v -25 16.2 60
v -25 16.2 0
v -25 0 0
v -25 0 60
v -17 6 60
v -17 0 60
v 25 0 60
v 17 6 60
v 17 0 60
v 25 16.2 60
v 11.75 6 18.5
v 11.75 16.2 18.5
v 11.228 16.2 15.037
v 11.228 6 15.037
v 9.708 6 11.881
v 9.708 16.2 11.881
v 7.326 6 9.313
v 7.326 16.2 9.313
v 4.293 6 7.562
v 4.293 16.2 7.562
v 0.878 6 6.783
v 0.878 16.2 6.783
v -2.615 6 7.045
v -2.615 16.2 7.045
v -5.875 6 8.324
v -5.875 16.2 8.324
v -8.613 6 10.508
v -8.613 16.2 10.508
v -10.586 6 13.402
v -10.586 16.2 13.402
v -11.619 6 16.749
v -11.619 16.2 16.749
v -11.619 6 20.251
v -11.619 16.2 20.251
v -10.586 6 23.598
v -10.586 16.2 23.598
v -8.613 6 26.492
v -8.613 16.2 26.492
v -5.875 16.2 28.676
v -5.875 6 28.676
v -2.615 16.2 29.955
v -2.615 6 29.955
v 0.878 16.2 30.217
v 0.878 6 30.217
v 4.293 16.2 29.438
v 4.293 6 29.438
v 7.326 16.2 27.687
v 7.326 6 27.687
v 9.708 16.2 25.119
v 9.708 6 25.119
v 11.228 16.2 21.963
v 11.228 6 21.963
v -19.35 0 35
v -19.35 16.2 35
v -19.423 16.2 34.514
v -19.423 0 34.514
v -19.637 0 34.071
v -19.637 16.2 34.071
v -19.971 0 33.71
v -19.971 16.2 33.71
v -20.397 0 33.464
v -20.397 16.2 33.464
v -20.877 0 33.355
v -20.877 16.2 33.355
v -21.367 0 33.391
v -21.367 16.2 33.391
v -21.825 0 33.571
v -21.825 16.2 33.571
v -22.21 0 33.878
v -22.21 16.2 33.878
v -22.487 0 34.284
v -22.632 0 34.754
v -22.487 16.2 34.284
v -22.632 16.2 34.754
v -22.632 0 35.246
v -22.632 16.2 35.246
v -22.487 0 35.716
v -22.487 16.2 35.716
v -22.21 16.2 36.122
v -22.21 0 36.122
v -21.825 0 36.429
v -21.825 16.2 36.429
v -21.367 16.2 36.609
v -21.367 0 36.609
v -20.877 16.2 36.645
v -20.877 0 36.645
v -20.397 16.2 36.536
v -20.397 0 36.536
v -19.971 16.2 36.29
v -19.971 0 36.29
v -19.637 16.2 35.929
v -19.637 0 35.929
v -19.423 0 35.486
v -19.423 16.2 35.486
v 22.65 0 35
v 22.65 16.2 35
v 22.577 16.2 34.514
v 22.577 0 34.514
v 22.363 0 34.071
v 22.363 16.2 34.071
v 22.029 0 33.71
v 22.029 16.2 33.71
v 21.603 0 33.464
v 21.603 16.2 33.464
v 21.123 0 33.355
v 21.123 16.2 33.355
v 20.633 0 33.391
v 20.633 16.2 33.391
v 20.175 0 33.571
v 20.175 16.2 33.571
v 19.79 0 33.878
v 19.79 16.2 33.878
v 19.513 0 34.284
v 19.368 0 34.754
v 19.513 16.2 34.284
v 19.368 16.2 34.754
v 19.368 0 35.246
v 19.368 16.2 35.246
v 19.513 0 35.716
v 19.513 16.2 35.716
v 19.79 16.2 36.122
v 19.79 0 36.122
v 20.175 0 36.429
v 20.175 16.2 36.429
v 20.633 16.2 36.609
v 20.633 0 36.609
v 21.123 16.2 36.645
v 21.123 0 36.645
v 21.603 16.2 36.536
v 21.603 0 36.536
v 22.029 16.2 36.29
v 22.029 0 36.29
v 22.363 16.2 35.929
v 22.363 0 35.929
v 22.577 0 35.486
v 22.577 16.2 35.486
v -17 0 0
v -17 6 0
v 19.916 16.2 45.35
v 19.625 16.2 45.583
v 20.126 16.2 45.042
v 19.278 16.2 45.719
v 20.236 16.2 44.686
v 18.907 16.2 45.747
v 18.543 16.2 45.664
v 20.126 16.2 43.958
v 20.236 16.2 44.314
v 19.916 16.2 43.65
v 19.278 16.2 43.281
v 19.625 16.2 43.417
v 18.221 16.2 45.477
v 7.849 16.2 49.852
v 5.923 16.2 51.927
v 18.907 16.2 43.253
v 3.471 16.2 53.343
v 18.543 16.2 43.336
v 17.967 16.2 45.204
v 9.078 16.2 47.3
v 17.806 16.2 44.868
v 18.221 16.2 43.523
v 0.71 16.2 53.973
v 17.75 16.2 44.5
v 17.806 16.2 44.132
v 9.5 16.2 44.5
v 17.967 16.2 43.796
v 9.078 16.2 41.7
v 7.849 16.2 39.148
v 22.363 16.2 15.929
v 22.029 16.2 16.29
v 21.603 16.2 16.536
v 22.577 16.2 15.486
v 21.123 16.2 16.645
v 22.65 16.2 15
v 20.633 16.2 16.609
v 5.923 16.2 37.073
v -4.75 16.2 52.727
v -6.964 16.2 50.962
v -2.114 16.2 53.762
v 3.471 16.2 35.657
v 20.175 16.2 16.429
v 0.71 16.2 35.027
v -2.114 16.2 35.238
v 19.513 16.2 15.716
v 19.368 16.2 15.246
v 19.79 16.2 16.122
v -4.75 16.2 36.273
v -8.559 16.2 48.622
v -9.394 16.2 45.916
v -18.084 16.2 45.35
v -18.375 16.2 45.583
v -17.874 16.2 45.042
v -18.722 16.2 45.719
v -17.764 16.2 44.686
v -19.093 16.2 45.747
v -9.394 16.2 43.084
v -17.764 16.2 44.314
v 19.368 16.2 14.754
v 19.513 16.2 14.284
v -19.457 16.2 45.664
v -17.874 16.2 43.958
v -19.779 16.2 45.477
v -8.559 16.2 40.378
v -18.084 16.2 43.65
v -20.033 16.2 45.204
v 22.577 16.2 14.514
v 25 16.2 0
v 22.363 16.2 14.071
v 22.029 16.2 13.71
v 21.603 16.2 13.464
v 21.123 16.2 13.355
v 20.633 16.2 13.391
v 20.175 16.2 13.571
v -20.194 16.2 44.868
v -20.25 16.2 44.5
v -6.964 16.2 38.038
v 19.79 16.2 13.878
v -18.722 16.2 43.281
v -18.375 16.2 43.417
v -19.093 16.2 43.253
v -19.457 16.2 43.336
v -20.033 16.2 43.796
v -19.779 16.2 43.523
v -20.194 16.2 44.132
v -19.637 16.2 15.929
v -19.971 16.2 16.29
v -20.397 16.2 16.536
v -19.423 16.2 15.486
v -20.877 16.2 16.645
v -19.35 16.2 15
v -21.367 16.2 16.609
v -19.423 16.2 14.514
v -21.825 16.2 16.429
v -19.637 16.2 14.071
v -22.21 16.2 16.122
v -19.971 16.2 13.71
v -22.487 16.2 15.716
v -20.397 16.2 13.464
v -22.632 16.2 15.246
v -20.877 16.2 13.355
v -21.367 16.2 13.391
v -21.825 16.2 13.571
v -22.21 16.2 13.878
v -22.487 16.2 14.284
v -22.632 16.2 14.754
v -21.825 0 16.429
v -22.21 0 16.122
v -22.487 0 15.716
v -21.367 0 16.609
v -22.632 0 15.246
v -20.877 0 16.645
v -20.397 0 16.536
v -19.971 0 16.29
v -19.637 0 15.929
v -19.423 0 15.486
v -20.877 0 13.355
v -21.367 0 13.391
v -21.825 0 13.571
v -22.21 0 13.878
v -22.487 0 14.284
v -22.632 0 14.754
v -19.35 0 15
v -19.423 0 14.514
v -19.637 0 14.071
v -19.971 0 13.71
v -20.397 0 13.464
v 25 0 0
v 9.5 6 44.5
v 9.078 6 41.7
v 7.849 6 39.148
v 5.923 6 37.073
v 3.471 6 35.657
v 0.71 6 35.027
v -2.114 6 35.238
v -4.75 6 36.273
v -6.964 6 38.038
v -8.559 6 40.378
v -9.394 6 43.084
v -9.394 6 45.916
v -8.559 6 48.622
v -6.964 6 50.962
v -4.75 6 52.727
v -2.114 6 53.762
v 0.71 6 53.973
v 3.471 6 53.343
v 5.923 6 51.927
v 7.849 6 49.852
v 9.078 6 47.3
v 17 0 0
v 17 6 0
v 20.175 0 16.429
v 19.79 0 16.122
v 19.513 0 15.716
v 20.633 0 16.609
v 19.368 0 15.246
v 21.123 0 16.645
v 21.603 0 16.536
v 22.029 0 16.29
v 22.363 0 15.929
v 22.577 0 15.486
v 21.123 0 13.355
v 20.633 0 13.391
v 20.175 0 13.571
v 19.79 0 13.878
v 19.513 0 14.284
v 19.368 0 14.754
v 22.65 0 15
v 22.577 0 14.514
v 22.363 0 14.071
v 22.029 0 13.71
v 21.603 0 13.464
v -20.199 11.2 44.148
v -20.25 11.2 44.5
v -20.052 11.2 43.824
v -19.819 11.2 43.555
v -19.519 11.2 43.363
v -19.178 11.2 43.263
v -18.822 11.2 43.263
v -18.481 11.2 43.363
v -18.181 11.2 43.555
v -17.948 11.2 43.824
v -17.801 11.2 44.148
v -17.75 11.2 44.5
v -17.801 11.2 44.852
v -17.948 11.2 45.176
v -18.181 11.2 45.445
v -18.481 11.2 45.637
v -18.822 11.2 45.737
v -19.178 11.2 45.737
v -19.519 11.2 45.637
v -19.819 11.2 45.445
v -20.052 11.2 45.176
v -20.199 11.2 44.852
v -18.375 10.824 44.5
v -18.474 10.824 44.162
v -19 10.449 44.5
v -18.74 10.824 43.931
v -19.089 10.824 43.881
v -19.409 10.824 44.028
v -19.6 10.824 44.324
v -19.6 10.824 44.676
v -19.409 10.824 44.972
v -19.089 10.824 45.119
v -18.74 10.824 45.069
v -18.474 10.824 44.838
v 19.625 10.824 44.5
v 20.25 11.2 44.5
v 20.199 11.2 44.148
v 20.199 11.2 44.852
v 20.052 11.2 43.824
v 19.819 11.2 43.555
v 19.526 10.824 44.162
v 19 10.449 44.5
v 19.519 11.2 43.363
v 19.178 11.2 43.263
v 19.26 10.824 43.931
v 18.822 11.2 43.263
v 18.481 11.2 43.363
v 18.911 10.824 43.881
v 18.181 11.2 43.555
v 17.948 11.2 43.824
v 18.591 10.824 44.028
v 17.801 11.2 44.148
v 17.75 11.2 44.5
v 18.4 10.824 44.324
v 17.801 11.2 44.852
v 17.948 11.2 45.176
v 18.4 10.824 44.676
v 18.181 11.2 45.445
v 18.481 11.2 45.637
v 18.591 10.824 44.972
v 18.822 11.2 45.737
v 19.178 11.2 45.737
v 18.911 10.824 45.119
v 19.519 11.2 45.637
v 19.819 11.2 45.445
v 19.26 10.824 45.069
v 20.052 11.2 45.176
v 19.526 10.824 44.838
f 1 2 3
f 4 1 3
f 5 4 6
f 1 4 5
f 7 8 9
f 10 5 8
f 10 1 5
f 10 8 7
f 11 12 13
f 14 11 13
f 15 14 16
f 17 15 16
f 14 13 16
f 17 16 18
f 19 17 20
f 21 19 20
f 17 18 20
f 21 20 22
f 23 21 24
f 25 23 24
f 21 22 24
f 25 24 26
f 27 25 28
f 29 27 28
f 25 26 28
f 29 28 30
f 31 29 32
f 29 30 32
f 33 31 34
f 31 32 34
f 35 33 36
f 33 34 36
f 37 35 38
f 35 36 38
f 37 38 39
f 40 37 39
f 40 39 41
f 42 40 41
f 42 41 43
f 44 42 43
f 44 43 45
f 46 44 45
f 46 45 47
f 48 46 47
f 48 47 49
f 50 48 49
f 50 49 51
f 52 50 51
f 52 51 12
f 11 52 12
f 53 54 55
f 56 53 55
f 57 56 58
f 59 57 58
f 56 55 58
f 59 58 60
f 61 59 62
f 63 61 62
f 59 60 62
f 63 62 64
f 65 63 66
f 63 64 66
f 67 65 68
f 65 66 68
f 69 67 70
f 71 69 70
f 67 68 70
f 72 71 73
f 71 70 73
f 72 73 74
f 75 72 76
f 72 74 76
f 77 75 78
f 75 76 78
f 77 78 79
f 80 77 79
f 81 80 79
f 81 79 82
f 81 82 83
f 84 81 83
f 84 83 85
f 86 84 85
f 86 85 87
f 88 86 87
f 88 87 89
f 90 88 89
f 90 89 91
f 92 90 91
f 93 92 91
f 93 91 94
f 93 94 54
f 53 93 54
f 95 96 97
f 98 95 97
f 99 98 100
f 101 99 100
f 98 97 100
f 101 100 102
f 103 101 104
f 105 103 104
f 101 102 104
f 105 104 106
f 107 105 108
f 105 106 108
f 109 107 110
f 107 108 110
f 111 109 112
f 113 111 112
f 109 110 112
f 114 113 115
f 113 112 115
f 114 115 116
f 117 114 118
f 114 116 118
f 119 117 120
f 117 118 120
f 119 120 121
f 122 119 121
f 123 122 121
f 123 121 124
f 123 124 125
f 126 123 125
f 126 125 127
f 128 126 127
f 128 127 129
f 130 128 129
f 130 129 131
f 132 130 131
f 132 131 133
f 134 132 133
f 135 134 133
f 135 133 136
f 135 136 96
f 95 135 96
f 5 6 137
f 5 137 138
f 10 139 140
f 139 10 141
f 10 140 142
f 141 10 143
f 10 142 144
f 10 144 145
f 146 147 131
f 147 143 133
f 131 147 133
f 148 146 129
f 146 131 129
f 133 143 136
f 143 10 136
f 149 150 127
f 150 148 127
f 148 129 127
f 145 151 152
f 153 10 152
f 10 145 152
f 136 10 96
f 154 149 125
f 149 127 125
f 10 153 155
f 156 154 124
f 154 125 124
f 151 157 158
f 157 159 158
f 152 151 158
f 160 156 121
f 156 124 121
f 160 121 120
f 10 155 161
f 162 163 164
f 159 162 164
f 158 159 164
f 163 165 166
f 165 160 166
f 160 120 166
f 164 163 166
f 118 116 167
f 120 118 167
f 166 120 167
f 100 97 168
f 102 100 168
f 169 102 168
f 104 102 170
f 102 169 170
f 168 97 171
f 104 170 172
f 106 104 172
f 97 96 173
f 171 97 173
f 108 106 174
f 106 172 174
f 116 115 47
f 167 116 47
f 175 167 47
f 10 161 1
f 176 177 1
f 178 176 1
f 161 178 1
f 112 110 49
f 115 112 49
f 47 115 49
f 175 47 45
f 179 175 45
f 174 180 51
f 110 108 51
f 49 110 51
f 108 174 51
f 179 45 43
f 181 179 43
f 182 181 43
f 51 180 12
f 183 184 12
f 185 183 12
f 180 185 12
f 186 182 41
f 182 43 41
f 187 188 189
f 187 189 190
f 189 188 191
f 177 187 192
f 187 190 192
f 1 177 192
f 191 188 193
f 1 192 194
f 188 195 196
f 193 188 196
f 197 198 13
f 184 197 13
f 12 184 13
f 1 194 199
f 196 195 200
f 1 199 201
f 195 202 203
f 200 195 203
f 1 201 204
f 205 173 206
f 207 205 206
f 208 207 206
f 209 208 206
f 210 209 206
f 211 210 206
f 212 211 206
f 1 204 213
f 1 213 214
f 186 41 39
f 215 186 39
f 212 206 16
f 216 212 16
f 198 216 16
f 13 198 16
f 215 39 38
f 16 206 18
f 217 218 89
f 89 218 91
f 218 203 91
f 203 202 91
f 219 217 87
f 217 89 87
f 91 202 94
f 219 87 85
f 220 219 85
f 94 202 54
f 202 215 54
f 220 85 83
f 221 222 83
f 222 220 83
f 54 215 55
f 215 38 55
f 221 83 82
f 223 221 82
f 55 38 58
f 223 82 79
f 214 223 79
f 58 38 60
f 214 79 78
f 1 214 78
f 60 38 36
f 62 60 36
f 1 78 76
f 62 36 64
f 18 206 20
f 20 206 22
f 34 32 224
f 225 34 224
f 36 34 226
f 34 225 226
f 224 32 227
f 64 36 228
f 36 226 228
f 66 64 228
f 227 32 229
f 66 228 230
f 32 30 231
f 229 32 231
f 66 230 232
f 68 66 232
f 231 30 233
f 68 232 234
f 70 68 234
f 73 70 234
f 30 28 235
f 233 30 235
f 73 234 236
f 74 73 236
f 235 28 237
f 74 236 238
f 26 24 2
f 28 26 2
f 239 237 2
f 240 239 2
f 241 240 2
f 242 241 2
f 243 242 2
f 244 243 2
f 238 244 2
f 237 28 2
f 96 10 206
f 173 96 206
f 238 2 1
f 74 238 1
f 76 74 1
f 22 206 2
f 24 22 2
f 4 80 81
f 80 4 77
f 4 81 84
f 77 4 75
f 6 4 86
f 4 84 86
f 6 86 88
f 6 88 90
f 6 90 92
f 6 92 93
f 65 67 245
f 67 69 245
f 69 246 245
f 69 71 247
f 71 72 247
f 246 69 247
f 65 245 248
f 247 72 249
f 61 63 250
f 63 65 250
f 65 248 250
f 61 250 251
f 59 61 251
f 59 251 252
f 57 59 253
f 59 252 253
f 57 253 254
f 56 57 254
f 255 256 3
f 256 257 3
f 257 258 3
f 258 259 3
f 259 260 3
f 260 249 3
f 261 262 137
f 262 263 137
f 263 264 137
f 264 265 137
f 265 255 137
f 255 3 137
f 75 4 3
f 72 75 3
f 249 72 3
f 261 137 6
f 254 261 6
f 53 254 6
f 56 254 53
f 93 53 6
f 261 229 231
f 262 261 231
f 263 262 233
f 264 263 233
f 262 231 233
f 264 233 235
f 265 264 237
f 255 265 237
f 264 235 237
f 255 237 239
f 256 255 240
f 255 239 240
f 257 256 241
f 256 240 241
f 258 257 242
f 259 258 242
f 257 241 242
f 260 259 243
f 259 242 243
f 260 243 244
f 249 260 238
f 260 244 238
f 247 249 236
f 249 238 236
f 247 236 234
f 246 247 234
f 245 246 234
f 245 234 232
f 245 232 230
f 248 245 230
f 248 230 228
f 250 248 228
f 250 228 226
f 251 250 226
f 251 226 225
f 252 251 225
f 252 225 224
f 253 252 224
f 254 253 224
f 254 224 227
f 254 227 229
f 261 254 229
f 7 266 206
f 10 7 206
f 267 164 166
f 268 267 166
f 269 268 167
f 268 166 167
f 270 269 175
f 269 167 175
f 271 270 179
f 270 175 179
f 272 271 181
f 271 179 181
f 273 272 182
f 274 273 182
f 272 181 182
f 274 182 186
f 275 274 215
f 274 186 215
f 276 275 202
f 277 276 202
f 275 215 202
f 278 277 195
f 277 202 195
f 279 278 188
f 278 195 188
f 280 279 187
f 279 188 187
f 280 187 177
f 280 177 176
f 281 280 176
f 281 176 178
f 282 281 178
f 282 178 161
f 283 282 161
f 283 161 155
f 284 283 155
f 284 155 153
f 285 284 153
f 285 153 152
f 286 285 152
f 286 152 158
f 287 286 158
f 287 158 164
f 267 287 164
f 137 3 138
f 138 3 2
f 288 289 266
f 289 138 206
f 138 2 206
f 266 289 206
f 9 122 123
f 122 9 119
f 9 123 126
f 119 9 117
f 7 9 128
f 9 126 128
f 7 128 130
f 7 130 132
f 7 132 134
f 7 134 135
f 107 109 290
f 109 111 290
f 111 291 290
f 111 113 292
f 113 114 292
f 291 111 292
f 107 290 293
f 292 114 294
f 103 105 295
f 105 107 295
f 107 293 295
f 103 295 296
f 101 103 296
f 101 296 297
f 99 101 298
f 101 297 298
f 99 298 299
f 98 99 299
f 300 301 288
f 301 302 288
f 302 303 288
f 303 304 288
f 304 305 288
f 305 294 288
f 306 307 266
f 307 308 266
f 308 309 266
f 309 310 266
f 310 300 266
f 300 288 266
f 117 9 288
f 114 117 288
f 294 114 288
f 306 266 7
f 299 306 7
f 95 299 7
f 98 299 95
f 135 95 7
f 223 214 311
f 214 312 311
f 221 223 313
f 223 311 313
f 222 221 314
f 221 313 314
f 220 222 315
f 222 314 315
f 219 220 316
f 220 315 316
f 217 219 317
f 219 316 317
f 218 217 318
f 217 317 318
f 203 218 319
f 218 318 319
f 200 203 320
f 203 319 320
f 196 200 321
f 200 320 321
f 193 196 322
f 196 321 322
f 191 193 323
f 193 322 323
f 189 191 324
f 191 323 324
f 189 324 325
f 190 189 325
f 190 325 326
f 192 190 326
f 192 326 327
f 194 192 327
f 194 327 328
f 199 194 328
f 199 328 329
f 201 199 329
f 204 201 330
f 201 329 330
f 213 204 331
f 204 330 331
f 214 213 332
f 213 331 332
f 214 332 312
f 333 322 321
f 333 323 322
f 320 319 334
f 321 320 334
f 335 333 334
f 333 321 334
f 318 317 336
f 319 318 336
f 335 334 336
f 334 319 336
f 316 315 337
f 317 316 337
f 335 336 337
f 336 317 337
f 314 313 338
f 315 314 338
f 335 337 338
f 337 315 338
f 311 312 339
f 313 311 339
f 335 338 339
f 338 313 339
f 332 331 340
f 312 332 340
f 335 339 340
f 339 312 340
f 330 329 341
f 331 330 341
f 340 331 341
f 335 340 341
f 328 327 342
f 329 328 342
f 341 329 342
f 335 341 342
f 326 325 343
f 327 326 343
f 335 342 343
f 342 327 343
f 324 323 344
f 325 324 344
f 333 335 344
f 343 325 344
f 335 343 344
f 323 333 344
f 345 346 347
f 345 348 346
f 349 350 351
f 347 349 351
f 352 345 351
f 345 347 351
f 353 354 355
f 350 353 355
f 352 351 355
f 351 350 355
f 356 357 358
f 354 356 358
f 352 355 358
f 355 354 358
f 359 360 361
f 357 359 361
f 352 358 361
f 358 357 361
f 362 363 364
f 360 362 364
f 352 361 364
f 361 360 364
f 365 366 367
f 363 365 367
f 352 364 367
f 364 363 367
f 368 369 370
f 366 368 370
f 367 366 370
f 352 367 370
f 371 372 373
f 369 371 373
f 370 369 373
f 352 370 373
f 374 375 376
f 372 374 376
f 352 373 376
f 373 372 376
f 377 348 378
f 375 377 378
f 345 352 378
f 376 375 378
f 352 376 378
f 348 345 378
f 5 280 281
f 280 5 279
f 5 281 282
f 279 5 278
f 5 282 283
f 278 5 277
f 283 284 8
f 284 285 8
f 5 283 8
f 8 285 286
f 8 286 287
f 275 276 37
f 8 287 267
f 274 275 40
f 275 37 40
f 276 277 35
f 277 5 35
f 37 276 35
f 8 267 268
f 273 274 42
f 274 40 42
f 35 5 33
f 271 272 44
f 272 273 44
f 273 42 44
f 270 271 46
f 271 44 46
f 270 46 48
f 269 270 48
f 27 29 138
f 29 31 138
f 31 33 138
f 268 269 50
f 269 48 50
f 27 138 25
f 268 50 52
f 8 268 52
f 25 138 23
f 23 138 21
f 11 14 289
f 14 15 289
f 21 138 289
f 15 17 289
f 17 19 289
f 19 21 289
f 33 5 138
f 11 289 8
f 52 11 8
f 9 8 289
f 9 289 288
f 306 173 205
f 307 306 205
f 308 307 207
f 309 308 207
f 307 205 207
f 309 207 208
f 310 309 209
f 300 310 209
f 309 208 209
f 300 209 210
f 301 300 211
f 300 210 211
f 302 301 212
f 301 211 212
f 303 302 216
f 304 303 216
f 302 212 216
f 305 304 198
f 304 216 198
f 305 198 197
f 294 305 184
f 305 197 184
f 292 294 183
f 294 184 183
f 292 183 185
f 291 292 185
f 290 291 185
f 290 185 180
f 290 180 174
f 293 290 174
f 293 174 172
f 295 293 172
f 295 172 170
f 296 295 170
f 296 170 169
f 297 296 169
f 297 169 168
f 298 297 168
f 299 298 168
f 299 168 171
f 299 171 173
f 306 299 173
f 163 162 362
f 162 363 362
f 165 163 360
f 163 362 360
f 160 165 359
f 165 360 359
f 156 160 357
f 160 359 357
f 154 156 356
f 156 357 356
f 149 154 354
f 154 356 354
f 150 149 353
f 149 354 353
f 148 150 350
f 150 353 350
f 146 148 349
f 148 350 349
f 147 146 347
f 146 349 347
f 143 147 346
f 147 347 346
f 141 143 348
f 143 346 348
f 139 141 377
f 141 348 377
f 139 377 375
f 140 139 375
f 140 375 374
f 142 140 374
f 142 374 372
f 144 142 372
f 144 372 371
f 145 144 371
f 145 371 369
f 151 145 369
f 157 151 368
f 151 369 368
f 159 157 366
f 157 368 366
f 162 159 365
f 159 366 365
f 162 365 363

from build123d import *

# Parameters (mm, degrees)
EXTRUDE_1_DEPTH     = 60
SKETCH_2_R          = 11.75
CUT_EXTRUDE_1_DEPTH = 40
SKETCH_3_R          = 9.5
CUT_EXTRUDE_2_DEPTH = 40
M3X0_5_1_D          = 2.5
M3X0_5_1_DEPTH      = 5
M3X0_5_1_TIP        = 0.751075774
CUT_EXTRUDE_3_REACH = 18.2
SKETCH_7_R          = 1.65


with BuildPart() as part:
    # 草圖1 → 填料-伸長1 (new body)
    with BuildSketch(Plane.XY):
        Polygon((-25, 0), (-17, 0), (-17, 6), (17, 6), (17, 0), (25, 0), (25, 16.2), (-25, 16.2), align=None)
    extrude(amount=EXTRUDE_1_DEPTH)

    # 草圖2 → 除料-伸長1 (cut)
    with BuildSketch(Plane(origin=(0, 16.2, 0), x_dir=(1, 0, 0), z_dir=(0, 1, 0))):
        with Locations((0, -18.5)):
            Circle(SKETCH_2_R)
    extrude(amount=-CUT_EXTRUDE_1_DEPTH, mode=Mode.SUBTRACT)

    # 草圖3 → 除料-伸長2 (cut)
    with BuildSketch(Plane(origin=(0, 16.2, 0), x_dir=(1, 0, 0), z_dir=(0, 1, 0))):
        with Locations((0, -44.5)):
            Circle(SKETCH_3_R)
    extrude(amount=-CUT_EXTRUDE_2_DEPTH, mode=Mode.SUBTRACT)

    # M3x0.5 螺紋孔1
    with Locations(Plane(origin=(0, 16.2, 0), x_dir=(1, 0, 0), z_dir=(0, 1, 0))):
        with Locations((19, -44.5), (-19, -44.5)):
            Hole(M3X0_5_1_D / 2, depth=M3X0_5_1_DEPTH)
            with Locations((0, 0, -(M3X0_5_1_DEPTH + M3X0_5_1_TIP / 2))):  # 118° drill point
                Cone(0, M3X0_5_1_D / 2, M3X0_5_1_TIP, mode=Mode.SUBTRACT)

    # 草圖7 → 除料-伸長3 (cut, up to next)
    with BuildSketch(Plane(origin=(0, 16.2, 0), x_dir=(1, 0, 0), z_dir=(0, 1, 0)), mode=Mode.PRIVATE) as cut_extrude_3_sk1:
        with Locations((-21, -35)):
            Circle(SKETCH_7_R)
    cut_extrude_3_tool1 = extrude(cut_extrude_3_sk1.sketch, amount=-CUT_EXTRUDE_3_REACH, mode=Mode.PRIVATE) & part.part
    add(cut_extrude_3_tool1.solids().sort_by_distance((-21, 16.2, 35))[0], mode=Mode.SUBTRACT)
    # 草圖7 → 除料-伸長3 (cut, up to next)
    with BuildSketch(Plane(origin=(0, 16.2, 0), x_dir=(1, 0, 0), z_dir=(0, 1, 0)), mode=Mode.PRIVATE) as cut_extrude_3_sk2:
        with Locations((-21, -15)):
            Circle(SKETCH_7_R)
    cut_extrude_3_tool2 = extrude(cut_extrude_3_sk2.sketch, amount=-CUT_EXTRUDE_3_REACH, mode=Mode.PRIVATE) & part.part
    add(cut_extrude_3_tool2.solids().sort_by_distance((-21, 16.2, 15))[0], mode=Mode.SUBTRACT)
    # 草圖7 → 除料-伸長3 (cut, up to next)
    with BuildSketch(Plane(origin=(0, 16.2, 0), x_dir=(1, 0, 0), z_dir=(0, 1, 0)), mode=Mode.PRIVATE) as cut_extrude_3_sk3:
        with Locations((21, -35)):
            Circle(SKETCH_7_R)
    cut_extrude_3_tool3 = extrude(cut_extrude_3_sk3.sketch, amount=-CUT_EXTRUDE_3_REACH, mode=Mode.PRIVATE) & part.part
    add(cut_extrude_3_tool3.solids().sort_by_distance((21, 16.2, 35))[0], mode=Mode.SUBTRACT)
    # 草圖7 → 除料-伸長3 (cut, up to next)
    with BuildSketch(Plane(origin=(0, 16.2, 0), x_dir=(1, 0, 0), z_dir=(0, 1, 0)), mode=Mode.PRIVATE) as cut_extrude_3_sk4:
        with Locations((21, -15)):
            Circle(SKETCH_7_R)
    cut_extrude_3_tool4 = extrude(cut_extrude_3_sk4.sketch, amount=-CUT_EXTRUDE_3_REACH, mode=Mode.PRIVATE) & part.part
    add(cut_extrude_3_tool4.solids().sort_by_distance((21, 16.2, 15))[0], mode=Mode.SUBTRACT)


solid = part.part
